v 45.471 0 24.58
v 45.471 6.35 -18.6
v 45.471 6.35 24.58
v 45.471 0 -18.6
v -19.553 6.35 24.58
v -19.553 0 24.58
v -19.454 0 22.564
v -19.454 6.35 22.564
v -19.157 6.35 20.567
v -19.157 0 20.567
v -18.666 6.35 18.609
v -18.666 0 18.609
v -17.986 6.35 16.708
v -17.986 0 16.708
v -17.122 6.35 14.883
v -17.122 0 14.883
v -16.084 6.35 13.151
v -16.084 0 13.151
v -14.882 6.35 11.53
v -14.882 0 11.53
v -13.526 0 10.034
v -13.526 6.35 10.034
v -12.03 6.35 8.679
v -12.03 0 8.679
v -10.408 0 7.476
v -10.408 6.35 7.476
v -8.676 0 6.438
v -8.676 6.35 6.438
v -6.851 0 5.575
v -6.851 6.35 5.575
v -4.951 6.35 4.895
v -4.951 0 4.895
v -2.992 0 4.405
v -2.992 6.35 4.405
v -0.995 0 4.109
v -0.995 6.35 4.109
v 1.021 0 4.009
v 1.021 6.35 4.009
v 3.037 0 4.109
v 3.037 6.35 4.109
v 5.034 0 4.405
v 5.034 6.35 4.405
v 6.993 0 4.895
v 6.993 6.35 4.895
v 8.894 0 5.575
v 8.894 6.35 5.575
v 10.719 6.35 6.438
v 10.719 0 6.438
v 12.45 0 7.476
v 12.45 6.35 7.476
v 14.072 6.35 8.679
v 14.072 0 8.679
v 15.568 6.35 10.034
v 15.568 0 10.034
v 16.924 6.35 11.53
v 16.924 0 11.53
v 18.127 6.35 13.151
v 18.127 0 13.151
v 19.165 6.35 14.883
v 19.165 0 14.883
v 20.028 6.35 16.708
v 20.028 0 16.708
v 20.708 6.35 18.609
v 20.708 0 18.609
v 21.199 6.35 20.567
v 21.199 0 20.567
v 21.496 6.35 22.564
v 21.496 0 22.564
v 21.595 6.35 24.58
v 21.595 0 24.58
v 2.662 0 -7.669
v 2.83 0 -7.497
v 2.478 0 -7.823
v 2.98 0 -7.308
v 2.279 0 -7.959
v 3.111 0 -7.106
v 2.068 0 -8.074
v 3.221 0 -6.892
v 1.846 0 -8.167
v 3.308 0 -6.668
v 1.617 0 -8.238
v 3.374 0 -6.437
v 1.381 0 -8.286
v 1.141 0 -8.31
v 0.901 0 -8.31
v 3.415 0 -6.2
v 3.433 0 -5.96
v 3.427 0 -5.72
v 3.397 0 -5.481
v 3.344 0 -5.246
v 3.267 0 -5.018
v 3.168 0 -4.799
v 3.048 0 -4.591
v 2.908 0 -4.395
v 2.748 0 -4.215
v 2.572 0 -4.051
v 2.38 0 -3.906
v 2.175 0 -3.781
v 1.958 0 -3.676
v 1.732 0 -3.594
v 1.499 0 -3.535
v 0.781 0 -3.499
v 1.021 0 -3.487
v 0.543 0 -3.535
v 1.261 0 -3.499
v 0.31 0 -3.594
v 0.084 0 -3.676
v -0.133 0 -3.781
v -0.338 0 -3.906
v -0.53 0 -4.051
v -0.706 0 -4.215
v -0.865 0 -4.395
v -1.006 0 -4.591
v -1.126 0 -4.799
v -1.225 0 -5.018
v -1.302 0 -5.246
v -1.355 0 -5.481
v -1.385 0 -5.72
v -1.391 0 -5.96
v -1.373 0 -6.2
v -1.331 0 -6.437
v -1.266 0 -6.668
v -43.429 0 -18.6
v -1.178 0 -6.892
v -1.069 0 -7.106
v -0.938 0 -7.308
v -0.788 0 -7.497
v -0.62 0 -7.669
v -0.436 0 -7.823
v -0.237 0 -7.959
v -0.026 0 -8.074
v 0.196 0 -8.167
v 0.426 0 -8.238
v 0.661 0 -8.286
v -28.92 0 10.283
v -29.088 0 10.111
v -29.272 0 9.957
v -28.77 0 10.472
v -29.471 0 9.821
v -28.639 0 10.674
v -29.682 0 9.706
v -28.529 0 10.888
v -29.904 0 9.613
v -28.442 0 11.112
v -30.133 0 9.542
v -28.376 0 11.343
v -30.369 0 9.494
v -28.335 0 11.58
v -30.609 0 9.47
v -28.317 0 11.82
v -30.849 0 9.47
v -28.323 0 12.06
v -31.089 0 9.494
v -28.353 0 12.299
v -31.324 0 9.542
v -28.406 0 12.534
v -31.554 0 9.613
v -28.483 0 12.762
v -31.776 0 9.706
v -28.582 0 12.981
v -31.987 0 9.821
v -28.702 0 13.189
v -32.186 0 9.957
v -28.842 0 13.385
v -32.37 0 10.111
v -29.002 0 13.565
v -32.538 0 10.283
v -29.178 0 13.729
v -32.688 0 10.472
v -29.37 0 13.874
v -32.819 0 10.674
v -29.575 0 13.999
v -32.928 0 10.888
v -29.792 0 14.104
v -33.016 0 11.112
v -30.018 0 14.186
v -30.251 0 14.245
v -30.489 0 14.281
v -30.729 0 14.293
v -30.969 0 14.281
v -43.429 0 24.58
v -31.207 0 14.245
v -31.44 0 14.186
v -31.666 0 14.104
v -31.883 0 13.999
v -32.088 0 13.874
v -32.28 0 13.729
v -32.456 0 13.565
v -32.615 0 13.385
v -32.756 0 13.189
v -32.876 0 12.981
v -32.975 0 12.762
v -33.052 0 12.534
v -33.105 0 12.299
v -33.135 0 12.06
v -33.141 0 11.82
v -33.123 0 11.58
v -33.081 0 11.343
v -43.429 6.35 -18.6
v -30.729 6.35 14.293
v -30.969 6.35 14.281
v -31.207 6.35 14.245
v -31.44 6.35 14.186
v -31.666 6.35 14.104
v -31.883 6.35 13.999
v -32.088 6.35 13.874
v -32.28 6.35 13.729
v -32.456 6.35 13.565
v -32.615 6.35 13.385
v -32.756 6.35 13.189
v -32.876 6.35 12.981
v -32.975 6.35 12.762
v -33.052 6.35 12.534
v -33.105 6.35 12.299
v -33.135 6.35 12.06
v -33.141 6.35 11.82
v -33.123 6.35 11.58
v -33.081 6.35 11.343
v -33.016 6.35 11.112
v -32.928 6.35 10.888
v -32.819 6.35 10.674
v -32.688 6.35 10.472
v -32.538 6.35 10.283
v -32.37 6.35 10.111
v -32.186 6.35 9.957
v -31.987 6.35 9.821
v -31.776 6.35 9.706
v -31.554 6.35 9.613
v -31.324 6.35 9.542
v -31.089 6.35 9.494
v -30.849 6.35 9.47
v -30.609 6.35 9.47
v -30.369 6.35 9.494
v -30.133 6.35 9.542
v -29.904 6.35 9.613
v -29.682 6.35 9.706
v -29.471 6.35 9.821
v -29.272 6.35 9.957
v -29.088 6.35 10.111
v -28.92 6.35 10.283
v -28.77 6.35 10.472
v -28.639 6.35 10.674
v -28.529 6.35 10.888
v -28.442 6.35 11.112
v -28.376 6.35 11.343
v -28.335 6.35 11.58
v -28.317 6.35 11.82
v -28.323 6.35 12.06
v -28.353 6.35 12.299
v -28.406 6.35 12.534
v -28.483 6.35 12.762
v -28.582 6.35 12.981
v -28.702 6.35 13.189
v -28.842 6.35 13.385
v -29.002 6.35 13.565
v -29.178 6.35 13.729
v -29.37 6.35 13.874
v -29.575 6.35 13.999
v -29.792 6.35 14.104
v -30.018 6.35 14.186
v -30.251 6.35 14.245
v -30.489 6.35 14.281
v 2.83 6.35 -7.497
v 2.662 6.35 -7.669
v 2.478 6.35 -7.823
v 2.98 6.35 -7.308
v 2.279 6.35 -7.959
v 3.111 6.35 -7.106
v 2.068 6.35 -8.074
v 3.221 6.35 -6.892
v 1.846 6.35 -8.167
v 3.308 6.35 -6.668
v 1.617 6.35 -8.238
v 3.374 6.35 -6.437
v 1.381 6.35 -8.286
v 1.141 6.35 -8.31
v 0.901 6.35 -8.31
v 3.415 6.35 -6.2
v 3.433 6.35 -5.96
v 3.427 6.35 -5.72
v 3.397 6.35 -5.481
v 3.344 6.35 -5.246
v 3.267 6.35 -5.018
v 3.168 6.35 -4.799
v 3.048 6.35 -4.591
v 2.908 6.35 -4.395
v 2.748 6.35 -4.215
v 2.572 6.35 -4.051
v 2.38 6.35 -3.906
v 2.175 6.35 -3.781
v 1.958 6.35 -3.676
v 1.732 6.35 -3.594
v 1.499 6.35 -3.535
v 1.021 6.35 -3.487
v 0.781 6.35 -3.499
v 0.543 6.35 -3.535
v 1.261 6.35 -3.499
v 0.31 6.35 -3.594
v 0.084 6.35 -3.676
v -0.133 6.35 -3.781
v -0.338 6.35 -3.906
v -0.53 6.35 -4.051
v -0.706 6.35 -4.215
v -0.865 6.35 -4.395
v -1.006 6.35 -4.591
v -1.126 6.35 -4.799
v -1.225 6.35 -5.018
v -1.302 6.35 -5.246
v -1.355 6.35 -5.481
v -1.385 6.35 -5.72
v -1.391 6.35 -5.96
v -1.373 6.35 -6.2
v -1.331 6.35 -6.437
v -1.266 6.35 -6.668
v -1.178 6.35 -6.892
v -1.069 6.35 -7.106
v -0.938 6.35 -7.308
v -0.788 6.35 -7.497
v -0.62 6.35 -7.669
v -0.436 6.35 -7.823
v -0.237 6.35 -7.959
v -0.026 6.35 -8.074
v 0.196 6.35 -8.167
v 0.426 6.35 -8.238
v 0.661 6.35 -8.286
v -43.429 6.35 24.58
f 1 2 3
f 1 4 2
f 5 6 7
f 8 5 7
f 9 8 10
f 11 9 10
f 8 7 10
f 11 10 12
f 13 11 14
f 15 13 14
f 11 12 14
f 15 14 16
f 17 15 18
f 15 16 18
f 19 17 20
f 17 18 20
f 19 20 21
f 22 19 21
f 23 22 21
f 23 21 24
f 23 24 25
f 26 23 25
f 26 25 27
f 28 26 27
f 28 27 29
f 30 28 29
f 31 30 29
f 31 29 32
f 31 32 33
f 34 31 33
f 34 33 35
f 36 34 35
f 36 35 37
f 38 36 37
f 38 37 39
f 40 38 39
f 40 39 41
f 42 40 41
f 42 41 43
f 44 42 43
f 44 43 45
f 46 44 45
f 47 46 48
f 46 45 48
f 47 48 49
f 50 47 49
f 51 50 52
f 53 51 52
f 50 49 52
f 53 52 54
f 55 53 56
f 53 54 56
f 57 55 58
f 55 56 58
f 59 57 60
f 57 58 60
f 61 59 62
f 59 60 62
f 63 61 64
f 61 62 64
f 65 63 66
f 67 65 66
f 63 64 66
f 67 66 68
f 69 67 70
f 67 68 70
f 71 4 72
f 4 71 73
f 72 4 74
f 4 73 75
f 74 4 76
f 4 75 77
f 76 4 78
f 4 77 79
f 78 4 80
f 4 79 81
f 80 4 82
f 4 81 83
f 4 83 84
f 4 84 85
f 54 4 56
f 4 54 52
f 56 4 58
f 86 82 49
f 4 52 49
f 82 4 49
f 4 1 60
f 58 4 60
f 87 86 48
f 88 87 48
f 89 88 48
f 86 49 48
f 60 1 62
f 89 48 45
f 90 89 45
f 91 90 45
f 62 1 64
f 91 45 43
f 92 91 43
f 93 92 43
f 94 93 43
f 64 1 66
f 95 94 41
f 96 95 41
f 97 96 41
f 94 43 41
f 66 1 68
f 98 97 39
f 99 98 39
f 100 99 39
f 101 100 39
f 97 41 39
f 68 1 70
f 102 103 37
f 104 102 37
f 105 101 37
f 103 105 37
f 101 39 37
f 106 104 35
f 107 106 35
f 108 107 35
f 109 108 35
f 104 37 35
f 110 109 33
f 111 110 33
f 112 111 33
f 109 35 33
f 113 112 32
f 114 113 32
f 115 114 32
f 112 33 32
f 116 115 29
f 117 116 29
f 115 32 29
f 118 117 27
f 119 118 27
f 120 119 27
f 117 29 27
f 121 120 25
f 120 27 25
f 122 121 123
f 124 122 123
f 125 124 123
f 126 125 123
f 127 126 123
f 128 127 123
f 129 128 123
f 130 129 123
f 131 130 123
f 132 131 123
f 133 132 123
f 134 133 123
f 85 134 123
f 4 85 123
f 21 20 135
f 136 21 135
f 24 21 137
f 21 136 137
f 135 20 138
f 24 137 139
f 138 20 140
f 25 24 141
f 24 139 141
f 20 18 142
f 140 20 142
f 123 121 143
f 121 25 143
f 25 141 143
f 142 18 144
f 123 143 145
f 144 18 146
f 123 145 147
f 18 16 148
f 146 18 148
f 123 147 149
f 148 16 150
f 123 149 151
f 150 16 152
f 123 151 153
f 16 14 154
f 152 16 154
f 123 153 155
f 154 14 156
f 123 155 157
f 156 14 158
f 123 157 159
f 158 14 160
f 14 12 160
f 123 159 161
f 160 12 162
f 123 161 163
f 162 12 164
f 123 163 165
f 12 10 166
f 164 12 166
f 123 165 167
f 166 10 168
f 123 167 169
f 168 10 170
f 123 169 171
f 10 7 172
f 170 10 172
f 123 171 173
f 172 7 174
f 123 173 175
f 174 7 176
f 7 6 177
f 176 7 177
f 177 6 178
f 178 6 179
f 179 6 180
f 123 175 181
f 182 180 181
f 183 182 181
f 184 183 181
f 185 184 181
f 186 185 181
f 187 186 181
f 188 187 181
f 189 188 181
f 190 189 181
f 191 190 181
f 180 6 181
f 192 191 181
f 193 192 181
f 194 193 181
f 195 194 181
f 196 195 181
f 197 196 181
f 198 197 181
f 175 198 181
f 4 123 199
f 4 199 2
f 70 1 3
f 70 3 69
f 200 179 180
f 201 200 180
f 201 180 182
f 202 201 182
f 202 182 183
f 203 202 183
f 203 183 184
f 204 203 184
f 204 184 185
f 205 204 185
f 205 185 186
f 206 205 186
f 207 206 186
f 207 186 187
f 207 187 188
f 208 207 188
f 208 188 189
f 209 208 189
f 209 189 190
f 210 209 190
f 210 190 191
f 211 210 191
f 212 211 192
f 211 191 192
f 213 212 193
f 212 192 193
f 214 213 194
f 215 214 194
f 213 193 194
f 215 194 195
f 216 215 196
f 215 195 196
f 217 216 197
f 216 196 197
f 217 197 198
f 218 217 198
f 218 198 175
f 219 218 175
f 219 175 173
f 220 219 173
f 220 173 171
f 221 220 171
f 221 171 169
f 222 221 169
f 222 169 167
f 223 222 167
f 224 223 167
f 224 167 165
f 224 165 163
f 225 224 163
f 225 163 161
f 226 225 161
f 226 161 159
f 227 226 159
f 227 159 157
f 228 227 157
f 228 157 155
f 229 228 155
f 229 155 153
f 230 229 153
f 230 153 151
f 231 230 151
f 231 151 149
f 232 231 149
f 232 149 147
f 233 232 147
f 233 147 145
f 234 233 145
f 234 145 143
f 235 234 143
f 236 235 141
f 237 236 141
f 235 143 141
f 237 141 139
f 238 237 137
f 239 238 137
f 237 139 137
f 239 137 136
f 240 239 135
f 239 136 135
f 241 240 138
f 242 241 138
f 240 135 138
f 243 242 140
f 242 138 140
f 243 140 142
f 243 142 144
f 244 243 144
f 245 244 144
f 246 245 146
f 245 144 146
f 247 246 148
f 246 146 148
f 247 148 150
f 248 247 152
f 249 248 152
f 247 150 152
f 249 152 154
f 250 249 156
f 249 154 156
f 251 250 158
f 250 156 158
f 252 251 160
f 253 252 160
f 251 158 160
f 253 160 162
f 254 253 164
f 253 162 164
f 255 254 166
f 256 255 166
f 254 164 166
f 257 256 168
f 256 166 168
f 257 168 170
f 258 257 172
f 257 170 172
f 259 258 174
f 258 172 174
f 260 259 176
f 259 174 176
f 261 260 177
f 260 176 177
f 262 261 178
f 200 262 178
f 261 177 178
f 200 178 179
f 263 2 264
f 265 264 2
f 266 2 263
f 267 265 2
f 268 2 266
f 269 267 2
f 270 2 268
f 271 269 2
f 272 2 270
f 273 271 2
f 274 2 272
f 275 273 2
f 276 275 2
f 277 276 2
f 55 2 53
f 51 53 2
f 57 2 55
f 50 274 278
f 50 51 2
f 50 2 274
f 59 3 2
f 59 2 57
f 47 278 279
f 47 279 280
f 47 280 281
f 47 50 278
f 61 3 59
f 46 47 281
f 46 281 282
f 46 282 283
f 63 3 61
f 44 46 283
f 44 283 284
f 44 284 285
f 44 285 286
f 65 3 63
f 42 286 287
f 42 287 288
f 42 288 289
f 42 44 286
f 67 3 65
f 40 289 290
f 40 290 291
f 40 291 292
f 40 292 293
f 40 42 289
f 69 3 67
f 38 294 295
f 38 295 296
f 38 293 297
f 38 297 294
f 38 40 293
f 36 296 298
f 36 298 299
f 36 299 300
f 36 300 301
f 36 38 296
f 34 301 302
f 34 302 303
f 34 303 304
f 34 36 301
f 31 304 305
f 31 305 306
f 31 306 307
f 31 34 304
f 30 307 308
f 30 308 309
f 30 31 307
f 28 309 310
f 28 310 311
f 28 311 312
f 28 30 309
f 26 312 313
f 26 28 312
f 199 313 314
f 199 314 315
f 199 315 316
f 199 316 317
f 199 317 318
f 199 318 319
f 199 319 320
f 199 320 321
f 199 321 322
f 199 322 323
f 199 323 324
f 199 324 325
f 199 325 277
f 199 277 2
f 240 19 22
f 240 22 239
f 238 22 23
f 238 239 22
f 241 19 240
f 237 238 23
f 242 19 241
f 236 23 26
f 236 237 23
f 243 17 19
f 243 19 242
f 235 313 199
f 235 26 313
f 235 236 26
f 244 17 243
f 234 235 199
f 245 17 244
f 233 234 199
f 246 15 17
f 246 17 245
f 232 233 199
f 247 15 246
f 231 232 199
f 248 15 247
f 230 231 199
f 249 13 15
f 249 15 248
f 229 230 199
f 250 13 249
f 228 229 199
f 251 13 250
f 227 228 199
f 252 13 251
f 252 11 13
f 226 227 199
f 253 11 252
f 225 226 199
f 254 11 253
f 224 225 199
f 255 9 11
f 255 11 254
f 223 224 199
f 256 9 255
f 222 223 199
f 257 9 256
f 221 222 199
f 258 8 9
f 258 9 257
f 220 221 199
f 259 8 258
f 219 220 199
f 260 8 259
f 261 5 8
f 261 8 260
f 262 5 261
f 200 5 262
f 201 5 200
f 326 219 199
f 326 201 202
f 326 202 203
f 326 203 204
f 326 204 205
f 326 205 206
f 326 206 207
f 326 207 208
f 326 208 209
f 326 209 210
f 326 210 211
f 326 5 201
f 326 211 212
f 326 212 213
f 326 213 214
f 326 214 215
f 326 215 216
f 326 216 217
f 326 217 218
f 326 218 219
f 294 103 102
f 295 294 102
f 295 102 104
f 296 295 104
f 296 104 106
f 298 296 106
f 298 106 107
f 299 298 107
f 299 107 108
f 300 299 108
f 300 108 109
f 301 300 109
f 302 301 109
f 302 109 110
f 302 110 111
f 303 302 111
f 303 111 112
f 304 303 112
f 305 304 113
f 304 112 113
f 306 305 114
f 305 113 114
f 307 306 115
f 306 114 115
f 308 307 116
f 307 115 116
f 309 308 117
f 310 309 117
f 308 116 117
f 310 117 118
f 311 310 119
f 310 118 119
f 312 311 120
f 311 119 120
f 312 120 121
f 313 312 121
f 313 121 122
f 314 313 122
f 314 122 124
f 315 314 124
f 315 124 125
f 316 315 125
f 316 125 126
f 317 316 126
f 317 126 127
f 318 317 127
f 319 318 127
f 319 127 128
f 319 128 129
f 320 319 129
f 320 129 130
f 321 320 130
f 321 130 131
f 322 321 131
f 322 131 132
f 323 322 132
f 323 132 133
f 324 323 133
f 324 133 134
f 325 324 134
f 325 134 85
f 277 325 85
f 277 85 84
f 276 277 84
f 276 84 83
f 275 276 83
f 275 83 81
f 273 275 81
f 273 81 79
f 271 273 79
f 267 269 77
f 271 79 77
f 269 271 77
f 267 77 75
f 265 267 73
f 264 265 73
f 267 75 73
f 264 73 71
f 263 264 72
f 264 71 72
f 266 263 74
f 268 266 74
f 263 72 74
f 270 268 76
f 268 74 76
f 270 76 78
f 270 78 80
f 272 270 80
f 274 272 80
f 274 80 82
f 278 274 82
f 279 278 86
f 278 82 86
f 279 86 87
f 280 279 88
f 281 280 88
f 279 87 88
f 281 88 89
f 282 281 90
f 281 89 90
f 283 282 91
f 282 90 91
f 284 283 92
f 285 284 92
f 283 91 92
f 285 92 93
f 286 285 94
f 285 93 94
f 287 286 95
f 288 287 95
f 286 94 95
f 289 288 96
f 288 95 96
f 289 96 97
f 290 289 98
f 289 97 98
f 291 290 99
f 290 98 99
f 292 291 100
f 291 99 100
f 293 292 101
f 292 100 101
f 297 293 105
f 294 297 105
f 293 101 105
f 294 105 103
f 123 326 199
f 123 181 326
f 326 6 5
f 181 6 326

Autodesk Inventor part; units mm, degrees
ref_plane "YZ Plane" through (0, 0, 0) normal (1, 0, 0) x (0, 1, 0)
ref_plane "XZ Plane" through (0, 0, 0) normal (0, 1, 0) x (-1, 0, 0)
ref_plane "XY Plane" through (0, 0, 0) normal (0, 0, 1) x (1, 0, 0)
sketch "Sketch1" plane through (0, 0, 0) normal (0, 1, 0) x (-1, 0, 0)
  line L0 (43.4289, -18.5999) -> (-45.4711, -18.5999)
  line L1 (-45.4711, -18.5999) -> (-45.4711, 24.5801)
  line L2 (-45.4711, 24.5801) -> (43.4289, 24.5801)
  line L3 (43.4289, 24.5801) -> (43.4289, -18.5999)
  point P0 (0, 0)
  dimension "d2" = 88.9
  dimension "d3" = 43.18
extrude "Extrusion1" add sketch "Sketch1" along normal blind 6.35
sketch "Sketch2" plane through (0, 6.35, 0) normal (0, 1, 0) x (1, 0, 0)
  line L0 (45.4711, -24.5801) -> (45.4711, 18.5999) projected
  line L1 (45.4711, 18.5999) -> (-43.4289, 18.5999) projected
  point P0 (0, 0)
  point P1 (1.0211, -24.5835)
  dimension "d22" = 44.45
  dimension "d23" = 43.1834
hole "Hole1" at (1.0211, 6.35, 24.5835) direction (0, -1, 0) diameter 41.148 end through all
sketch "Sketch3" plane through (0, 6.35, 0) normal (0, 1, 0) x (1, 0, 0)
  line L0 (-43.4289, 18.5999) -> (-43.4289, -24.5801) projected
  line L1 (-43.4289, -24.5801) -> (-19.5529, -24.5801) projected
  point P0 (0, 0)
  point P1 (-30.7289, -11.8801)
  dimension "d13" = 12.7
  dimension "d14" = 12.7
hole "Hole2" at (-30.7289, 6.35, 11.8801) direction (0, -1, 0) diameter 4.826 end through all
sketch "Sketch4" plane through (0, 6.35, 0) normal (0, 1, 0) x (1, 0, 0)
  line L0 (45.4711, 18.5999) -> (-43.4289, 18.5999) projected
  line L1 (45.4711, -24.5801) -> (45.4711, 18.5999) projected
  point P0 (0, 0)
  point P1 (1.0211, 5.8999)
  dimension "d24" = 12.7
  dimension "d25" = 44.45
hole "Hole3" at (1.0211, 6.35, -5.8999) direction (0, -1, 0) diameter 4.826 end through all
properties part number "InventorPart1Commit3"
